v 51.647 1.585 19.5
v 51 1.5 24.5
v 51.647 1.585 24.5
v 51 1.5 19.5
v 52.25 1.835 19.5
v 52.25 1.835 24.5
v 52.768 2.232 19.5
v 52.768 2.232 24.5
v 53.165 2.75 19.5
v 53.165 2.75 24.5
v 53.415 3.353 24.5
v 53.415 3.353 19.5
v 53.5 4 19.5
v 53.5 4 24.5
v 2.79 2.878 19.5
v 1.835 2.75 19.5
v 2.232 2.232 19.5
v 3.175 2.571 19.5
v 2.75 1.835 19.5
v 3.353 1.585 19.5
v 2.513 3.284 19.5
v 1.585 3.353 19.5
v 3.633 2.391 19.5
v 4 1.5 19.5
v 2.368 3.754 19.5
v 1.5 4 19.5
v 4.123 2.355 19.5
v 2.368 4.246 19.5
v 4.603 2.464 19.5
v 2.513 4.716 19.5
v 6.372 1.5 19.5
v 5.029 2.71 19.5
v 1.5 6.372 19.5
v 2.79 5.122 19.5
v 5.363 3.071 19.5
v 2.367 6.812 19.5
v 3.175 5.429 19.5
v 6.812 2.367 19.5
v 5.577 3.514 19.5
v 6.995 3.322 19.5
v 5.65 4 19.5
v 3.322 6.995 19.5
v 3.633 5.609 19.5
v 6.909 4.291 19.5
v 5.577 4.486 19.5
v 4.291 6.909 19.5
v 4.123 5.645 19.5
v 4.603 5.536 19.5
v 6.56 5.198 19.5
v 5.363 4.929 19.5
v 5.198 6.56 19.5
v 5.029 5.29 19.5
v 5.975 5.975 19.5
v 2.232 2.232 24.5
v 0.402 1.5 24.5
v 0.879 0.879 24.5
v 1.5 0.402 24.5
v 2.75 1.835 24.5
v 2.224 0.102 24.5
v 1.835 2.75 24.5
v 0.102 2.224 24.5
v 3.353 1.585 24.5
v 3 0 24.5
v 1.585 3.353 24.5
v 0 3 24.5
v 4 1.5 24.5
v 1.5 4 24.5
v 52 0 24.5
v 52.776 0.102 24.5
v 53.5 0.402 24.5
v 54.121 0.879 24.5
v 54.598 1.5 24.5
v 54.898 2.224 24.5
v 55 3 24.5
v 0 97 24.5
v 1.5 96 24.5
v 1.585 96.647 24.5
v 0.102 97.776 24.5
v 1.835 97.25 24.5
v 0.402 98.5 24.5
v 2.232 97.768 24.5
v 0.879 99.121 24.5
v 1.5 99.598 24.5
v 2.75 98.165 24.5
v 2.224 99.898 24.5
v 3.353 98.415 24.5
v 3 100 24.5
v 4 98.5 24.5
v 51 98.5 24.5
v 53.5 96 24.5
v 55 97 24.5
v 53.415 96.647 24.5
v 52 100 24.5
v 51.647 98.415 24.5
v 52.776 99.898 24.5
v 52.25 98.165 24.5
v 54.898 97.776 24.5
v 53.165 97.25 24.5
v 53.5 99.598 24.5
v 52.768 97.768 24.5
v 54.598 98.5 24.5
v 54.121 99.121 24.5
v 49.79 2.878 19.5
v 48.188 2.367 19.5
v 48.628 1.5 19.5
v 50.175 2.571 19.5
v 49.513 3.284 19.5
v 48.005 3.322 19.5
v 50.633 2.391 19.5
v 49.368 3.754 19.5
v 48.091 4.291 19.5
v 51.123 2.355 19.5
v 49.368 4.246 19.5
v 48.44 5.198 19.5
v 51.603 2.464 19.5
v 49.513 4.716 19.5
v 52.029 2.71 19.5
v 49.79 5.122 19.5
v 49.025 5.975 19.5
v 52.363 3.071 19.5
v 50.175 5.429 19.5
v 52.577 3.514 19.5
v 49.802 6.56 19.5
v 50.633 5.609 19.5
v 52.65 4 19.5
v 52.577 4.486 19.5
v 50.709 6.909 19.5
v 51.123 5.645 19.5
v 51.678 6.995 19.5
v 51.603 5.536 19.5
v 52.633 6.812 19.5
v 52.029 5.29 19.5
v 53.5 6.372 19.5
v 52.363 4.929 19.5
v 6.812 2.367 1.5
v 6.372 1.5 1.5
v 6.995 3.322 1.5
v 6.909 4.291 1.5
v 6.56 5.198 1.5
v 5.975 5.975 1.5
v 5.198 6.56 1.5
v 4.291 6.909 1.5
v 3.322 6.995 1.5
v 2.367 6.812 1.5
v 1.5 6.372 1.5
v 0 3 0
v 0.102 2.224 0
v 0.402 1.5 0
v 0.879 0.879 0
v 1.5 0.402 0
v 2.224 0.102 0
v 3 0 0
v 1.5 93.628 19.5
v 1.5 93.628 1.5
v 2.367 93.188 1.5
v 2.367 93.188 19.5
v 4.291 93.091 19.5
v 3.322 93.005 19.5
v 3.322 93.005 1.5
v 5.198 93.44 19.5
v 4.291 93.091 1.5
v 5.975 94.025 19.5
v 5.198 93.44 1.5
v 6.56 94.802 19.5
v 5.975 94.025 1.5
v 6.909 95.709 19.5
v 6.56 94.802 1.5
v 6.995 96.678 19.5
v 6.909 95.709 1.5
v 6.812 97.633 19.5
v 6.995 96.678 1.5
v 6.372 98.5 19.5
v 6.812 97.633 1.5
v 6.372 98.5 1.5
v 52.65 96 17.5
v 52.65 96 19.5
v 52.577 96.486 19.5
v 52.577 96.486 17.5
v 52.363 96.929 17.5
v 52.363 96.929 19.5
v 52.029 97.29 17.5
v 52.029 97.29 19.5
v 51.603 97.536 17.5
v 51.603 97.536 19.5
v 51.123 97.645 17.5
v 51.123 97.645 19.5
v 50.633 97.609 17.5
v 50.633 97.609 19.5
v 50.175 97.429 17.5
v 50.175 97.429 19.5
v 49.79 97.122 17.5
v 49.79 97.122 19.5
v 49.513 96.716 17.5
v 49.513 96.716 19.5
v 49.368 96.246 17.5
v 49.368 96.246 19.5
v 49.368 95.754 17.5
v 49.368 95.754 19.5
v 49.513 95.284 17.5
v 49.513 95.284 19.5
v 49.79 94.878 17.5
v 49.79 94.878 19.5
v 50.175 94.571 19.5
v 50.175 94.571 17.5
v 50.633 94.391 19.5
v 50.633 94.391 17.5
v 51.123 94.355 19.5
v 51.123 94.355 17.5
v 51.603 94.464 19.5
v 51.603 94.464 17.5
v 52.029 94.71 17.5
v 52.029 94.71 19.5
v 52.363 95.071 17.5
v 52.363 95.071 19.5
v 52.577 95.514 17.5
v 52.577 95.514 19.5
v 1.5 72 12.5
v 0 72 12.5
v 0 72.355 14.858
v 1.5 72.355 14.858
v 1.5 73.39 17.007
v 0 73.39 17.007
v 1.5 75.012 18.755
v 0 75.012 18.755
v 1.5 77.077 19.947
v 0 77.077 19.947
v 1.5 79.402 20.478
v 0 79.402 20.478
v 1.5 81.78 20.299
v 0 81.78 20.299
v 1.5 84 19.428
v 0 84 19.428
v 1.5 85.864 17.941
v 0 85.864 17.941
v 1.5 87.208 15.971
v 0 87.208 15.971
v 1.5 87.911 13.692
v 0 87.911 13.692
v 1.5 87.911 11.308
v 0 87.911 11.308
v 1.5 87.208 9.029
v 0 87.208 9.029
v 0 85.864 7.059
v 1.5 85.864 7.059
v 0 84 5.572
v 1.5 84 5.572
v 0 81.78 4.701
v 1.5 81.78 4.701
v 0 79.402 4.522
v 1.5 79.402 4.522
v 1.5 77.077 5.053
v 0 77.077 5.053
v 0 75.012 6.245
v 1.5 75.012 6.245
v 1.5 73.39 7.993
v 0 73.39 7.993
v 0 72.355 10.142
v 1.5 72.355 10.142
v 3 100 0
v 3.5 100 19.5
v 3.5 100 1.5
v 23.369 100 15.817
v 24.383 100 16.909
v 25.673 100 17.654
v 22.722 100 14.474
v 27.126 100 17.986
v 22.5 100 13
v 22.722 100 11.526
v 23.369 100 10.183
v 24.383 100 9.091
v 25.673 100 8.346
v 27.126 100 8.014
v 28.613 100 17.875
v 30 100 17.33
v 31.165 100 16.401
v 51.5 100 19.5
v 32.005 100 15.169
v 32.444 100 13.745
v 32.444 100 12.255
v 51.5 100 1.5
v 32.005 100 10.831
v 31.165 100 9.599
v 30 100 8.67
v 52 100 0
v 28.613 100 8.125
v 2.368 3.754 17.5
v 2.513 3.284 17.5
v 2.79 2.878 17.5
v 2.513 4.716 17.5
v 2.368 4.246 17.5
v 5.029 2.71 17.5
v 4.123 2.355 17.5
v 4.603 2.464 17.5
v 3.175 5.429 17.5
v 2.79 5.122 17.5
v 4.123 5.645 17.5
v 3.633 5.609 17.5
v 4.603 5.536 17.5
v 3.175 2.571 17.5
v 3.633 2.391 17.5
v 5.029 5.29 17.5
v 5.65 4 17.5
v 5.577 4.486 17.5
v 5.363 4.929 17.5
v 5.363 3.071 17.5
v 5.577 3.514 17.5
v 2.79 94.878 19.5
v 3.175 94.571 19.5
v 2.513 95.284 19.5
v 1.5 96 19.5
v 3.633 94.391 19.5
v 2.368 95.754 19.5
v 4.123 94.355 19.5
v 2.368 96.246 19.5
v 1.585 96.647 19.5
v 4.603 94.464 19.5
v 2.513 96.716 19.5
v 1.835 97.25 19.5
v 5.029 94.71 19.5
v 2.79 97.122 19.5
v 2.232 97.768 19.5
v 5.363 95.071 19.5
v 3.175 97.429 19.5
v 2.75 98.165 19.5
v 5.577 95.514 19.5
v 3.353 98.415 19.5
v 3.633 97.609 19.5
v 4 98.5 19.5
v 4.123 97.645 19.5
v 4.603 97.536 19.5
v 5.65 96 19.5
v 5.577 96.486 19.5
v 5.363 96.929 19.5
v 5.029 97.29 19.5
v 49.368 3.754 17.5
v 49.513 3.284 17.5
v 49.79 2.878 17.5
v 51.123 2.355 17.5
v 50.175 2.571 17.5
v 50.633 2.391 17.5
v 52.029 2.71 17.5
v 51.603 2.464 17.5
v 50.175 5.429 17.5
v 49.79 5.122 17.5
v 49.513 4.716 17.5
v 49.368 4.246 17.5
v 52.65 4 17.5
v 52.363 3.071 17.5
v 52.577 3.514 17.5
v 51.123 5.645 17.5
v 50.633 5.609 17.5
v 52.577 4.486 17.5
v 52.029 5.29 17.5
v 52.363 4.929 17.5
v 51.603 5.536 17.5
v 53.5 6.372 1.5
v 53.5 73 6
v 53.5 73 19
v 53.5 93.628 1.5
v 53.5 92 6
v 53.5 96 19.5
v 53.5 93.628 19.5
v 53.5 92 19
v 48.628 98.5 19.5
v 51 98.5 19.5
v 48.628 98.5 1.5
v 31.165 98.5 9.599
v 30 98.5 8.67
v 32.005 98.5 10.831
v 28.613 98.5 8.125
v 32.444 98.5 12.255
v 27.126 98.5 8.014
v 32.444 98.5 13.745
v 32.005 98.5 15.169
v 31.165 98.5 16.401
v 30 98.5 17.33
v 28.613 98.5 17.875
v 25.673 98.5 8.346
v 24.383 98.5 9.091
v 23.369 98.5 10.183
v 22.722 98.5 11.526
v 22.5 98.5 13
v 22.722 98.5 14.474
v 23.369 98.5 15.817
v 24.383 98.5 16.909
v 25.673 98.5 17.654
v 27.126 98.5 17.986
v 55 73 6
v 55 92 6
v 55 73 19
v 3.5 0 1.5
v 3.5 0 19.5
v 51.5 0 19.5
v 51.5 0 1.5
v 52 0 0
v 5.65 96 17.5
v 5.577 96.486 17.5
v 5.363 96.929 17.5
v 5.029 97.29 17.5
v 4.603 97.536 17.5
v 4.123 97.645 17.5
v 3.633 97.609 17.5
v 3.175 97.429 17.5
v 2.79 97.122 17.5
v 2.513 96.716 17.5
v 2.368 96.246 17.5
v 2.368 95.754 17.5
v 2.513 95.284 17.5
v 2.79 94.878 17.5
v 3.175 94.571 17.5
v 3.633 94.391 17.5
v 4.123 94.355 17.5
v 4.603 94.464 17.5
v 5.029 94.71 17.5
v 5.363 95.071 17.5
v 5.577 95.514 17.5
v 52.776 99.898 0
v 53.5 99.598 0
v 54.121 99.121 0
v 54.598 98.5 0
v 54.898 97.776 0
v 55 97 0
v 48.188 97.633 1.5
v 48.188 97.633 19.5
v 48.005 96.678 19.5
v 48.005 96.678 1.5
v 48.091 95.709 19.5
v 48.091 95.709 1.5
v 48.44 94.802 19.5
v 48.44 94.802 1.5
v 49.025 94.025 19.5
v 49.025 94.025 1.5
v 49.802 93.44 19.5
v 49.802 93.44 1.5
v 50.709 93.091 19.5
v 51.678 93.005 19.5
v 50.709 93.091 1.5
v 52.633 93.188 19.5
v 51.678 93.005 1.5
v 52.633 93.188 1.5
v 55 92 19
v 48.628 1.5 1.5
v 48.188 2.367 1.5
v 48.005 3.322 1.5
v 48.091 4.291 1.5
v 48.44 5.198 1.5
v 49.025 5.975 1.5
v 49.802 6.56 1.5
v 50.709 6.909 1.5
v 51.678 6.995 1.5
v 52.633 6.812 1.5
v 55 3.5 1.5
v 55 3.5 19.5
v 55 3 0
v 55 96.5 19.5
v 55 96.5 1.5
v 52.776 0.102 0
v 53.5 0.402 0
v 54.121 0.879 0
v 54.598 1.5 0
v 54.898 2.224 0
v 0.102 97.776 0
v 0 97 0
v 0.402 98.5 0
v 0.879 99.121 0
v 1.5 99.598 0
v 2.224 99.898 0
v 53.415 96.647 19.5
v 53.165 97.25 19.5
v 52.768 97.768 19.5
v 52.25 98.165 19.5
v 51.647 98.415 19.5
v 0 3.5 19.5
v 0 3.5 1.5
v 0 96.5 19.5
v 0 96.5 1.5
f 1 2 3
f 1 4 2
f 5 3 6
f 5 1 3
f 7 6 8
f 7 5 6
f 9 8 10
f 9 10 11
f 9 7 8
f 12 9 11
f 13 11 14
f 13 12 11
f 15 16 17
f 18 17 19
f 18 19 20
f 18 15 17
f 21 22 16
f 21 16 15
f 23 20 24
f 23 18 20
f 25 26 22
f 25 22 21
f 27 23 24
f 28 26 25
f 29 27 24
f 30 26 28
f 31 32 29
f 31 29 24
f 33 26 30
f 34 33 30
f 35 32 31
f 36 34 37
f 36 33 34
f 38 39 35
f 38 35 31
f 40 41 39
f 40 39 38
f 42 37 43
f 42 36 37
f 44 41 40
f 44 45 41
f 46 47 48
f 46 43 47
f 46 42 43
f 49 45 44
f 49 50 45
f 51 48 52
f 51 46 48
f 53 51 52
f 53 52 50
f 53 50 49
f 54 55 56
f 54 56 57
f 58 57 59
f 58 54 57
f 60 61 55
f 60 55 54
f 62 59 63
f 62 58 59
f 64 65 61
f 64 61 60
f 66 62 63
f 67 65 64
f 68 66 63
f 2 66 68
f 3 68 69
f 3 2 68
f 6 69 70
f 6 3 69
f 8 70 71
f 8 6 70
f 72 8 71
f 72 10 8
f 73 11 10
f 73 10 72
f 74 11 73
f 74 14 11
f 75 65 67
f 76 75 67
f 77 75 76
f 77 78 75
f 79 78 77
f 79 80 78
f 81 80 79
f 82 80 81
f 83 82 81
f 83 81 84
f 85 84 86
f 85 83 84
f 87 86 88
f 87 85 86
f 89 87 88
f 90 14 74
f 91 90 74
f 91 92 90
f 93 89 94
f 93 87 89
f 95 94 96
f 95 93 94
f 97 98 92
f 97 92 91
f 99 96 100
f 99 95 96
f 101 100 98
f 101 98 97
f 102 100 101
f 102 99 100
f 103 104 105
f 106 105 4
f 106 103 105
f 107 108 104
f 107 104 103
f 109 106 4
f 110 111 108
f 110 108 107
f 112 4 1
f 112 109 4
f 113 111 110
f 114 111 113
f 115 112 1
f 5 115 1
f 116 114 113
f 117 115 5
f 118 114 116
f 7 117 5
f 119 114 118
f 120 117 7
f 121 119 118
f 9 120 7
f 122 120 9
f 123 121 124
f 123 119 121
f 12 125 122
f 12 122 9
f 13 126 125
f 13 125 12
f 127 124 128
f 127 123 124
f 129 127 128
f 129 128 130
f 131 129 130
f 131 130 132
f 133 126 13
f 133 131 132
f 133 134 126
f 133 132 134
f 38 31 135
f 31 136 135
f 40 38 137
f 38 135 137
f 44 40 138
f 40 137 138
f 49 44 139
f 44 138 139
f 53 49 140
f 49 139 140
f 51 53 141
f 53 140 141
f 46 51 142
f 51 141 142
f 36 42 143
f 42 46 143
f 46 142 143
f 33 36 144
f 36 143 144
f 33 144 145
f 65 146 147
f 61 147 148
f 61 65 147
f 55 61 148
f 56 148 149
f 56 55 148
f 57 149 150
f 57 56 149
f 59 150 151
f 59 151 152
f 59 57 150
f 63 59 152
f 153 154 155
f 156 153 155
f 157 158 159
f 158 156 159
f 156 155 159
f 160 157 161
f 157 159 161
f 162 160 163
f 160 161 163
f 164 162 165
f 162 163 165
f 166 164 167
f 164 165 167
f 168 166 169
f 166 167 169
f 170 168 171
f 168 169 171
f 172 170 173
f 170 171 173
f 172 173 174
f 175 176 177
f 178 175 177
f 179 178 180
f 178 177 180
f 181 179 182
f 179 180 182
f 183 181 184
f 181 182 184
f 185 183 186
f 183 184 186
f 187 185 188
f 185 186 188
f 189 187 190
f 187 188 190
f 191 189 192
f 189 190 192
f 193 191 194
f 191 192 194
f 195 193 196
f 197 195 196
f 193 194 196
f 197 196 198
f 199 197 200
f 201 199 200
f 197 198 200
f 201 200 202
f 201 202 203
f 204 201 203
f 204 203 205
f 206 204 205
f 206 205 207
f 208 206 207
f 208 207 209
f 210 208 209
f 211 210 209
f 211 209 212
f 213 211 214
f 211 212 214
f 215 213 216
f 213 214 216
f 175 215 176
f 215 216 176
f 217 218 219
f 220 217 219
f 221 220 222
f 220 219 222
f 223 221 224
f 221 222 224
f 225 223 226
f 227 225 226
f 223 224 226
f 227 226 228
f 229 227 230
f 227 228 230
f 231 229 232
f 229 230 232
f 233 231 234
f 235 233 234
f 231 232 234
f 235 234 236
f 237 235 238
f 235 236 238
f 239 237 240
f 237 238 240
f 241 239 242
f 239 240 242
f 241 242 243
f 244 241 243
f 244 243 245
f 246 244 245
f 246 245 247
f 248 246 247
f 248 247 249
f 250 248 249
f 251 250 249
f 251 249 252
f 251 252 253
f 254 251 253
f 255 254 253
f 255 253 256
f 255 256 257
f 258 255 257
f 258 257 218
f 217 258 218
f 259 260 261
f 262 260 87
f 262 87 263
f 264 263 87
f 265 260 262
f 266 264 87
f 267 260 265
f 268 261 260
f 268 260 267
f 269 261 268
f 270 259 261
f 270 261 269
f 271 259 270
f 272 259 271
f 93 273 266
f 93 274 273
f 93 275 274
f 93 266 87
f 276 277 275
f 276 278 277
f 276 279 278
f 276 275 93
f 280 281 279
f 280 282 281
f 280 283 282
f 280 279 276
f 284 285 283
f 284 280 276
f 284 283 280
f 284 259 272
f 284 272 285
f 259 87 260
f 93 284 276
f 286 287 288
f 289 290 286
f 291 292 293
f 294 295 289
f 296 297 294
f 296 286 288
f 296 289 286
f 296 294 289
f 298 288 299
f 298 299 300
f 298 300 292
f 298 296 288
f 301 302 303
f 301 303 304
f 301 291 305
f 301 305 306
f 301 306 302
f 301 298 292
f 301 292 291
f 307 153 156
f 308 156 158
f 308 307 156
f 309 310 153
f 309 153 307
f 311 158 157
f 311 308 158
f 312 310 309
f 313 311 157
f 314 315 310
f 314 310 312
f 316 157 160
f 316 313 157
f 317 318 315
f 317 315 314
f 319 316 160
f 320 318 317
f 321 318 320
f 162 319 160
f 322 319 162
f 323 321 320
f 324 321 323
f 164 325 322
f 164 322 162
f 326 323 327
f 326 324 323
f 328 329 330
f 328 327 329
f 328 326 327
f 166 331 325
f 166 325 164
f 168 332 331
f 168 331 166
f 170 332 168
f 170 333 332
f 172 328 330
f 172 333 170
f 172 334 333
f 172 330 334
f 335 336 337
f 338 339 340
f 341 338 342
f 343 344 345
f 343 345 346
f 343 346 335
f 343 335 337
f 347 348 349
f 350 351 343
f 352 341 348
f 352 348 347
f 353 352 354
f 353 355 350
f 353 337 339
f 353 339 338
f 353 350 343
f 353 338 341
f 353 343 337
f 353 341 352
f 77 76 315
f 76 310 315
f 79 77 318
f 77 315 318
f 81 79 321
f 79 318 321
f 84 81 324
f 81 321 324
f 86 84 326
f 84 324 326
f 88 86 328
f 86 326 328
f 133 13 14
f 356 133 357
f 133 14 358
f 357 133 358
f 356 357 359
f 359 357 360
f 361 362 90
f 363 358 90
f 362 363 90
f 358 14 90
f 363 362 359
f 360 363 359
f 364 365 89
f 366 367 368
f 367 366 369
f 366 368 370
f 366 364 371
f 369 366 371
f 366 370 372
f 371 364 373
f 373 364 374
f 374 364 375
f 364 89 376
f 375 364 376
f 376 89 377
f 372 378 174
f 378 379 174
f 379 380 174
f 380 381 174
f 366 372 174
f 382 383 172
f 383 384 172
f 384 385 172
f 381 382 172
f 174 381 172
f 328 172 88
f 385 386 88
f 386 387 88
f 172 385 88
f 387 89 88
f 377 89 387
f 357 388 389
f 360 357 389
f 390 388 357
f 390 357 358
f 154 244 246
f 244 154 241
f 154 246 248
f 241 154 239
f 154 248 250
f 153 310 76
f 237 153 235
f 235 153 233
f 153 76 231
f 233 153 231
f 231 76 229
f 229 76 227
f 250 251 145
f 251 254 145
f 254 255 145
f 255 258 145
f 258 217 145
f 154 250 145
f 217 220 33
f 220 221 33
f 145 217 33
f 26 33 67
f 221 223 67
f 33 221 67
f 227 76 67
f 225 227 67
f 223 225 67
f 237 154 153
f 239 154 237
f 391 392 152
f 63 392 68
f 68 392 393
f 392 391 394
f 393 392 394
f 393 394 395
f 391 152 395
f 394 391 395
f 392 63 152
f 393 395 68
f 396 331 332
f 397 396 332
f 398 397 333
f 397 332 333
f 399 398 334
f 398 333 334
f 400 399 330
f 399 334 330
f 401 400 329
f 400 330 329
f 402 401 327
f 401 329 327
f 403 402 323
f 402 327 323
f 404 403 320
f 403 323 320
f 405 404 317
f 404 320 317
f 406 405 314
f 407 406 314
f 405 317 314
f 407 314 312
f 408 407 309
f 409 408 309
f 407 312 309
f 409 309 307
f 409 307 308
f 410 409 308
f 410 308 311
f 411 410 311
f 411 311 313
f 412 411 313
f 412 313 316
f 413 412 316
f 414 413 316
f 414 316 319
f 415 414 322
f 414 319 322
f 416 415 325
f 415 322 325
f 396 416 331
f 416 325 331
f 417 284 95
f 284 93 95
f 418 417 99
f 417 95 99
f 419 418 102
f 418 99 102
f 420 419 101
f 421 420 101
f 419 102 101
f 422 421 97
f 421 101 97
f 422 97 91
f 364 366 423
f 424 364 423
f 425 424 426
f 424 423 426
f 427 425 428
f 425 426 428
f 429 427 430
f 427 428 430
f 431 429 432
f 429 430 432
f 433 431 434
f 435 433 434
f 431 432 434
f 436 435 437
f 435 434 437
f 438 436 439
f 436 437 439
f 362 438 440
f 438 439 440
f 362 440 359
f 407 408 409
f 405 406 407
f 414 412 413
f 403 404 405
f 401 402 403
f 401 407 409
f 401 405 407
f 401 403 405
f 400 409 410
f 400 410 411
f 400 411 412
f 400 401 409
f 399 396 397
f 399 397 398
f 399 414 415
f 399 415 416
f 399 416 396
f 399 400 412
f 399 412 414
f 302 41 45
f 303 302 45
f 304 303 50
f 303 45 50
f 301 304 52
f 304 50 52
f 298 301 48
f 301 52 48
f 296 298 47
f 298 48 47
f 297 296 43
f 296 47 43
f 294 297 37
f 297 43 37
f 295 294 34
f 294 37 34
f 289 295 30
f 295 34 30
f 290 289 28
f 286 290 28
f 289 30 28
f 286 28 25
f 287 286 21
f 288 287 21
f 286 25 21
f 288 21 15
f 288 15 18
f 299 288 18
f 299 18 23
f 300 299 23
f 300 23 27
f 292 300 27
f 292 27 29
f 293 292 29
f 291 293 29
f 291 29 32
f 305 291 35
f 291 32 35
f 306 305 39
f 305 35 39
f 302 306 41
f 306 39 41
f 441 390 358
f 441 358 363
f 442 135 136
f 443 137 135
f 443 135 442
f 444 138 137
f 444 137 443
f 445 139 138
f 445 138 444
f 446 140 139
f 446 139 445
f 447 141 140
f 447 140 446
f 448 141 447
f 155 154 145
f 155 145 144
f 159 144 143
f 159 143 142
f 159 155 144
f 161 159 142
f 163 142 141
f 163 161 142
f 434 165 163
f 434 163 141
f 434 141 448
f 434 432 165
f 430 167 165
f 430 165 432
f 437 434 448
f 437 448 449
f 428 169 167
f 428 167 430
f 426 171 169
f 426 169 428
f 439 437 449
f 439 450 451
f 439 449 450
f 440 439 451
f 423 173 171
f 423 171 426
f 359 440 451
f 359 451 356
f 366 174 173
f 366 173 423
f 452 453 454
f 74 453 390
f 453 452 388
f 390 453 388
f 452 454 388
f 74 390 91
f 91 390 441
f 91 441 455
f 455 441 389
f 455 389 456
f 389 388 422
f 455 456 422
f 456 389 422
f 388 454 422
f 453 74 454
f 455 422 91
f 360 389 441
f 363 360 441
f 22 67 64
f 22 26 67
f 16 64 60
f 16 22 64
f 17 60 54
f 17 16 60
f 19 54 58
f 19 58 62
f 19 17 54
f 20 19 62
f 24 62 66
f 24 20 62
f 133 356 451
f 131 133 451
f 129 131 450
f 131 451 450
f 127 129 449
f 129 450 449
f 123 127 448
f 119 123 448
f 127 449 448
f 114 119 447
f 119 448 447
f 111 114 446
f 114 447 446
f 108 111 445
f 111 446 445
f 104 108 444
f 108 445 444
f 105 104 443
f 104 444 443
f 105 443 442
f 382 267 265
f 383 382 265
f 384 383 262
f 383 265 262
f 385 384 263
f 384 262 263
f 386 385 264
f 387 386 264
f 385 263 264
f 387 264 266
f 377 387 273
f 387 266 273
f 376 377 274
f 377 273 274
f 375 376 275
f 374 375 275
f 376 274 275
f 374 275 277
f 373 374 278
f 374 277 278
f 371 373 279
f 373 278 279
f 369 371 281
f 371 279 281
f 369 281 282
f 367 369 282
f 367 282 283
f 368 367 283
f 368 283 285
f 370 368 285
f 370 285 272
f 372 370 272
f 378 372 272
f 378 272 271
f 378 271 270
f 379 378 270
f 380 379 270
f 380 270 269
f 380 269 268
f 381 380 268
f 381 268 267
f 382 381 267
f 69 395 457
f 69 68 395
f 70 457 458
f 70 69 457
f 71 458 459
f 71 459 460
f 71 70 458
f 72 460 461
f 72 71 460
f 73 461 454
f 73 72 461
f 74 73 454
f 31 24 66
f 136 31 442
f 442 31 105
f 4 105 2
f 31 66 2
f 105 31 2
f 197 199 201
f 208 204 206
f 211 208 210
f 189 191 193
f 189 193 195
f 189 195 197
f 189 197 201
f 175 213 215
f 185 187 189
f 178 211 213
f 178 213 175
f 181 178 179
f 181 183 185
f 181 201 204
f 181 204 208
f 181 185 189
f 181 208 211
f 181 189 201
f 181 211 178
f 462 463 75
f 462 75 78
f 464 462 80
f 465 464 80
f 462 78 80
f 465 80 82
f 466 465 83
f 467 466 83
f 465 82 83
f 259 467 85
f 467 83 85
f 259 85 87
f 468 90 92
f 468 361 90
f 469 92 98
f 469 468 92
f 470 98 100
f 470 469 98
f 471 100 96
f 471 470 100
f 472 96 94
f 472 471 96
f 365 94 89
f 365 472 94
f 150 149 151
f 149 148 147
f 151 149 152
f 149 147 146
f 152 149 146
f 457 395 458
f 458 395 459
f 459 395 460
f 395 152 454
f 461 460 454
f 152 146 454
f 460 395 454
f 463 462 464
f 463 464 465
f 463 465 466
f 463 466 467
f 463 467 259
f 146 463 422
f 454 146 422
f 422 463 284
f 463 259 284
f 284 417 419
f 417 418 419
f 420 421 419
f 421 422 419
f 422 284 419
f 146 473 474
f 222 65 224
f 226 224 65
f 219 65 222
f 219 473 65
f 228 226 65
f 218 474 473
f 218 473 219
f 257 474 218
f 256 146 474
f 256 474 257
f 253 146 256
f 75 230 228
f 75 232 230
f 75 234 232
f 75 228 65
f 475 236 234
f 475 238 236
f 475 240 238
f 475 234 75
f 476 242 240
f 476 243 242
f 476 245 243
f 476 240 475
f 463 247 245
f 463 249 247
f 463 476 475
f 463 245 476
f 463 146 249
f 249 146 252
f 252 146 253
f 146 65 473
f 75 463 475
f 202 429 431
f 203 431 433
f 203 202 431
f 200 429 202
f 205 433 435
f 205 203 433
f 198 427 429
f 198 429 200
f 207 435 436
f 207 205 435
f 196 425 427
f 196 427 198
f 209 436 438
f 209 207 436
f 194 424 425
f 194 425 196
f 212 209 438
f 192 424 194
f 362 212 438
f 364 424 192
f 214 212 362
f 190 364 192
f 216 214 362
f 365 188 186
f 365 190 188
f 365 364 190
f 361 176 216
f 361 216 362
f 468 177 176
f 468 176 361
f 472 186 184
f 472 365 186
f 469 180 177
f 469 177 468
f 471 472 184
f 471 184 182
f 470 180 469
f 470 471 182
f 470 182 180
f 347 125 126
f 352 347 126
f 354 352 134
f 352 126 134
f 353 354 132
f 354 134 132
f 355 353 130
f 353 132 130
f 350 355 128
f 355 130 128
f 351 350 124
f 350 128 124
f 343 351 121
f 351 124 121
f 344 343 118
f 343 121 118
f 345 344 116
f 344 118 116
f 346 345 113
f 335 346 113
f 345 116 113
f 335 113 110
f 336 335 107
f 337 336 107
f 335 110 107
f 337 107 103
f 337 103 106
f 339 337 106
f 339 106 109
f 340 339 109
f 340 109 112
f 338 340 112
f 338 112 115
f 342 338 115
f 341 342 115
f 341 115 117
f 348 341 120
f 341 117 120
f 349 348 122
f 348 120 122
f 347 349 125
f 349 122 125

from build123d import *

# Parameters (mm, degrees)
F0_W      = 55
F0_H      = 100
F1_DEPTH  = 24.5
F3_DEPTH  = 23
F4_R      = 5
F5_DEPTH  = 2
F6_R      = 8
F7_DEPTH  = 2
F8_R      = 3.5
F9_DEPTH  = 18
F10_R     = 1.65
F11_DEPTH = 2
F12_R     = 3
F13_R     = 2.5
F14_W     = 19
F14_H     = 13
F15_DEPTH = 2


with BuildPart() as f1:
    # F0 (on Top) → F1 (new body)
    with BuildSketch(Plane.XY):
        with Locations((27.5, 50)):
            Rectangle(F0_W, F0_H)
    extrude(amount=F1_DEPTH)

    # F2 (on face) → F3 (cut)
    with BuildSketch(Plane.XY.offset(24.5)):
        Polygon((27.5, 98.5), (1.5, 98.5), (1.5, 50), (1.5, 1.5), (27.5, 1.5), (53.5, 1.5), (53.5, 50), (53.5, 98.5), align=None)
    extrude(amount=-F3_DEPTH, mode=Mode.SUBTRACT)

    # F4 (on face) → F5 (cut)
    with BuildSketch(Plane(origin=(0, 100, 0), x_dir=(-1, 0, 0), z_dir=(0, 1, 0))):
        with Locations((-27.5, 13)):
            Circle(F4_R)
    extrude(amount=-F5_DEPTH, mode=Mode.SUBTRACT)

    # F6 (on face) → F7 (cut)
    with BuildSketch(Plane(origin=(0, 0, 0), x_dir=(0, -1, 0), z_dir=(-1, 0, 0))):
        with Locations((-80, 12.5)):
            Circle(F6_R)
    extrude(amount=-F7_DEPTH, mode=Mode.SUBTRACT)

    # F8 (on face) → F9 (join)
    with BuildSketch(Plane.XY.offset(1.5)):
        with Locations((3.5, 96.5)):
            Circle(F8_R)
        with Locations((51.5, 96.5)):
            Circle(F8_R)
        with Locations((51.5, 3.5)):
            Circle(F8_R)
        with Locations((3.5, 3.5)):
            Circle(F8_R)
    extrude(amount=F9_DEPTH)

    # F10 (on face) → F11 (cut)
    with BuildSketch(Plane.XY.offset(19.5)):
        with Locations((4, 96)):
            Circle(F10_R)
        with Locations((4, 4)):
            Circle(F10_R)
        with Locations((51, 96)):
            Circle(F10_R)
        with Locations((51, 4)):
            Circle(F10_R)
    extrude(amount=-F11_DEPTH, mode=Mode.SUBTRACT)

    # F12
    f12_edges = [f1.edges().sort_by_distance(p)[0] for p in [
        (0, 100, 12.25),
        (55, 100, 12.25),
        (0, 0, 12.25),
        (55, 0, 12.25),
    ]]
    fillet(f12_edges, radius=F12_R)

    # F13
    f13_edges = [f1.edges().sort_by_distance(p)[0] for p in [
        (1.5, 98.5, 22),
        (53.5, 98.5, 22),
        (1.5, 1.5, 22),
        (53.5, 1.5, 22),
    ]]
    fillet(f13_edges, radius=F13_R)

    # F14 (on face) → F15 (cut)
    with BuildSketch(Plane.YZ.offset(55)):
        with Locations((82.5, 12.5)):
            Rectangle(F14_W, F14_H)
    extrude(amount=-F15_DEPTH, mode=Mode.SUBTRACT)


solid = f1.part
